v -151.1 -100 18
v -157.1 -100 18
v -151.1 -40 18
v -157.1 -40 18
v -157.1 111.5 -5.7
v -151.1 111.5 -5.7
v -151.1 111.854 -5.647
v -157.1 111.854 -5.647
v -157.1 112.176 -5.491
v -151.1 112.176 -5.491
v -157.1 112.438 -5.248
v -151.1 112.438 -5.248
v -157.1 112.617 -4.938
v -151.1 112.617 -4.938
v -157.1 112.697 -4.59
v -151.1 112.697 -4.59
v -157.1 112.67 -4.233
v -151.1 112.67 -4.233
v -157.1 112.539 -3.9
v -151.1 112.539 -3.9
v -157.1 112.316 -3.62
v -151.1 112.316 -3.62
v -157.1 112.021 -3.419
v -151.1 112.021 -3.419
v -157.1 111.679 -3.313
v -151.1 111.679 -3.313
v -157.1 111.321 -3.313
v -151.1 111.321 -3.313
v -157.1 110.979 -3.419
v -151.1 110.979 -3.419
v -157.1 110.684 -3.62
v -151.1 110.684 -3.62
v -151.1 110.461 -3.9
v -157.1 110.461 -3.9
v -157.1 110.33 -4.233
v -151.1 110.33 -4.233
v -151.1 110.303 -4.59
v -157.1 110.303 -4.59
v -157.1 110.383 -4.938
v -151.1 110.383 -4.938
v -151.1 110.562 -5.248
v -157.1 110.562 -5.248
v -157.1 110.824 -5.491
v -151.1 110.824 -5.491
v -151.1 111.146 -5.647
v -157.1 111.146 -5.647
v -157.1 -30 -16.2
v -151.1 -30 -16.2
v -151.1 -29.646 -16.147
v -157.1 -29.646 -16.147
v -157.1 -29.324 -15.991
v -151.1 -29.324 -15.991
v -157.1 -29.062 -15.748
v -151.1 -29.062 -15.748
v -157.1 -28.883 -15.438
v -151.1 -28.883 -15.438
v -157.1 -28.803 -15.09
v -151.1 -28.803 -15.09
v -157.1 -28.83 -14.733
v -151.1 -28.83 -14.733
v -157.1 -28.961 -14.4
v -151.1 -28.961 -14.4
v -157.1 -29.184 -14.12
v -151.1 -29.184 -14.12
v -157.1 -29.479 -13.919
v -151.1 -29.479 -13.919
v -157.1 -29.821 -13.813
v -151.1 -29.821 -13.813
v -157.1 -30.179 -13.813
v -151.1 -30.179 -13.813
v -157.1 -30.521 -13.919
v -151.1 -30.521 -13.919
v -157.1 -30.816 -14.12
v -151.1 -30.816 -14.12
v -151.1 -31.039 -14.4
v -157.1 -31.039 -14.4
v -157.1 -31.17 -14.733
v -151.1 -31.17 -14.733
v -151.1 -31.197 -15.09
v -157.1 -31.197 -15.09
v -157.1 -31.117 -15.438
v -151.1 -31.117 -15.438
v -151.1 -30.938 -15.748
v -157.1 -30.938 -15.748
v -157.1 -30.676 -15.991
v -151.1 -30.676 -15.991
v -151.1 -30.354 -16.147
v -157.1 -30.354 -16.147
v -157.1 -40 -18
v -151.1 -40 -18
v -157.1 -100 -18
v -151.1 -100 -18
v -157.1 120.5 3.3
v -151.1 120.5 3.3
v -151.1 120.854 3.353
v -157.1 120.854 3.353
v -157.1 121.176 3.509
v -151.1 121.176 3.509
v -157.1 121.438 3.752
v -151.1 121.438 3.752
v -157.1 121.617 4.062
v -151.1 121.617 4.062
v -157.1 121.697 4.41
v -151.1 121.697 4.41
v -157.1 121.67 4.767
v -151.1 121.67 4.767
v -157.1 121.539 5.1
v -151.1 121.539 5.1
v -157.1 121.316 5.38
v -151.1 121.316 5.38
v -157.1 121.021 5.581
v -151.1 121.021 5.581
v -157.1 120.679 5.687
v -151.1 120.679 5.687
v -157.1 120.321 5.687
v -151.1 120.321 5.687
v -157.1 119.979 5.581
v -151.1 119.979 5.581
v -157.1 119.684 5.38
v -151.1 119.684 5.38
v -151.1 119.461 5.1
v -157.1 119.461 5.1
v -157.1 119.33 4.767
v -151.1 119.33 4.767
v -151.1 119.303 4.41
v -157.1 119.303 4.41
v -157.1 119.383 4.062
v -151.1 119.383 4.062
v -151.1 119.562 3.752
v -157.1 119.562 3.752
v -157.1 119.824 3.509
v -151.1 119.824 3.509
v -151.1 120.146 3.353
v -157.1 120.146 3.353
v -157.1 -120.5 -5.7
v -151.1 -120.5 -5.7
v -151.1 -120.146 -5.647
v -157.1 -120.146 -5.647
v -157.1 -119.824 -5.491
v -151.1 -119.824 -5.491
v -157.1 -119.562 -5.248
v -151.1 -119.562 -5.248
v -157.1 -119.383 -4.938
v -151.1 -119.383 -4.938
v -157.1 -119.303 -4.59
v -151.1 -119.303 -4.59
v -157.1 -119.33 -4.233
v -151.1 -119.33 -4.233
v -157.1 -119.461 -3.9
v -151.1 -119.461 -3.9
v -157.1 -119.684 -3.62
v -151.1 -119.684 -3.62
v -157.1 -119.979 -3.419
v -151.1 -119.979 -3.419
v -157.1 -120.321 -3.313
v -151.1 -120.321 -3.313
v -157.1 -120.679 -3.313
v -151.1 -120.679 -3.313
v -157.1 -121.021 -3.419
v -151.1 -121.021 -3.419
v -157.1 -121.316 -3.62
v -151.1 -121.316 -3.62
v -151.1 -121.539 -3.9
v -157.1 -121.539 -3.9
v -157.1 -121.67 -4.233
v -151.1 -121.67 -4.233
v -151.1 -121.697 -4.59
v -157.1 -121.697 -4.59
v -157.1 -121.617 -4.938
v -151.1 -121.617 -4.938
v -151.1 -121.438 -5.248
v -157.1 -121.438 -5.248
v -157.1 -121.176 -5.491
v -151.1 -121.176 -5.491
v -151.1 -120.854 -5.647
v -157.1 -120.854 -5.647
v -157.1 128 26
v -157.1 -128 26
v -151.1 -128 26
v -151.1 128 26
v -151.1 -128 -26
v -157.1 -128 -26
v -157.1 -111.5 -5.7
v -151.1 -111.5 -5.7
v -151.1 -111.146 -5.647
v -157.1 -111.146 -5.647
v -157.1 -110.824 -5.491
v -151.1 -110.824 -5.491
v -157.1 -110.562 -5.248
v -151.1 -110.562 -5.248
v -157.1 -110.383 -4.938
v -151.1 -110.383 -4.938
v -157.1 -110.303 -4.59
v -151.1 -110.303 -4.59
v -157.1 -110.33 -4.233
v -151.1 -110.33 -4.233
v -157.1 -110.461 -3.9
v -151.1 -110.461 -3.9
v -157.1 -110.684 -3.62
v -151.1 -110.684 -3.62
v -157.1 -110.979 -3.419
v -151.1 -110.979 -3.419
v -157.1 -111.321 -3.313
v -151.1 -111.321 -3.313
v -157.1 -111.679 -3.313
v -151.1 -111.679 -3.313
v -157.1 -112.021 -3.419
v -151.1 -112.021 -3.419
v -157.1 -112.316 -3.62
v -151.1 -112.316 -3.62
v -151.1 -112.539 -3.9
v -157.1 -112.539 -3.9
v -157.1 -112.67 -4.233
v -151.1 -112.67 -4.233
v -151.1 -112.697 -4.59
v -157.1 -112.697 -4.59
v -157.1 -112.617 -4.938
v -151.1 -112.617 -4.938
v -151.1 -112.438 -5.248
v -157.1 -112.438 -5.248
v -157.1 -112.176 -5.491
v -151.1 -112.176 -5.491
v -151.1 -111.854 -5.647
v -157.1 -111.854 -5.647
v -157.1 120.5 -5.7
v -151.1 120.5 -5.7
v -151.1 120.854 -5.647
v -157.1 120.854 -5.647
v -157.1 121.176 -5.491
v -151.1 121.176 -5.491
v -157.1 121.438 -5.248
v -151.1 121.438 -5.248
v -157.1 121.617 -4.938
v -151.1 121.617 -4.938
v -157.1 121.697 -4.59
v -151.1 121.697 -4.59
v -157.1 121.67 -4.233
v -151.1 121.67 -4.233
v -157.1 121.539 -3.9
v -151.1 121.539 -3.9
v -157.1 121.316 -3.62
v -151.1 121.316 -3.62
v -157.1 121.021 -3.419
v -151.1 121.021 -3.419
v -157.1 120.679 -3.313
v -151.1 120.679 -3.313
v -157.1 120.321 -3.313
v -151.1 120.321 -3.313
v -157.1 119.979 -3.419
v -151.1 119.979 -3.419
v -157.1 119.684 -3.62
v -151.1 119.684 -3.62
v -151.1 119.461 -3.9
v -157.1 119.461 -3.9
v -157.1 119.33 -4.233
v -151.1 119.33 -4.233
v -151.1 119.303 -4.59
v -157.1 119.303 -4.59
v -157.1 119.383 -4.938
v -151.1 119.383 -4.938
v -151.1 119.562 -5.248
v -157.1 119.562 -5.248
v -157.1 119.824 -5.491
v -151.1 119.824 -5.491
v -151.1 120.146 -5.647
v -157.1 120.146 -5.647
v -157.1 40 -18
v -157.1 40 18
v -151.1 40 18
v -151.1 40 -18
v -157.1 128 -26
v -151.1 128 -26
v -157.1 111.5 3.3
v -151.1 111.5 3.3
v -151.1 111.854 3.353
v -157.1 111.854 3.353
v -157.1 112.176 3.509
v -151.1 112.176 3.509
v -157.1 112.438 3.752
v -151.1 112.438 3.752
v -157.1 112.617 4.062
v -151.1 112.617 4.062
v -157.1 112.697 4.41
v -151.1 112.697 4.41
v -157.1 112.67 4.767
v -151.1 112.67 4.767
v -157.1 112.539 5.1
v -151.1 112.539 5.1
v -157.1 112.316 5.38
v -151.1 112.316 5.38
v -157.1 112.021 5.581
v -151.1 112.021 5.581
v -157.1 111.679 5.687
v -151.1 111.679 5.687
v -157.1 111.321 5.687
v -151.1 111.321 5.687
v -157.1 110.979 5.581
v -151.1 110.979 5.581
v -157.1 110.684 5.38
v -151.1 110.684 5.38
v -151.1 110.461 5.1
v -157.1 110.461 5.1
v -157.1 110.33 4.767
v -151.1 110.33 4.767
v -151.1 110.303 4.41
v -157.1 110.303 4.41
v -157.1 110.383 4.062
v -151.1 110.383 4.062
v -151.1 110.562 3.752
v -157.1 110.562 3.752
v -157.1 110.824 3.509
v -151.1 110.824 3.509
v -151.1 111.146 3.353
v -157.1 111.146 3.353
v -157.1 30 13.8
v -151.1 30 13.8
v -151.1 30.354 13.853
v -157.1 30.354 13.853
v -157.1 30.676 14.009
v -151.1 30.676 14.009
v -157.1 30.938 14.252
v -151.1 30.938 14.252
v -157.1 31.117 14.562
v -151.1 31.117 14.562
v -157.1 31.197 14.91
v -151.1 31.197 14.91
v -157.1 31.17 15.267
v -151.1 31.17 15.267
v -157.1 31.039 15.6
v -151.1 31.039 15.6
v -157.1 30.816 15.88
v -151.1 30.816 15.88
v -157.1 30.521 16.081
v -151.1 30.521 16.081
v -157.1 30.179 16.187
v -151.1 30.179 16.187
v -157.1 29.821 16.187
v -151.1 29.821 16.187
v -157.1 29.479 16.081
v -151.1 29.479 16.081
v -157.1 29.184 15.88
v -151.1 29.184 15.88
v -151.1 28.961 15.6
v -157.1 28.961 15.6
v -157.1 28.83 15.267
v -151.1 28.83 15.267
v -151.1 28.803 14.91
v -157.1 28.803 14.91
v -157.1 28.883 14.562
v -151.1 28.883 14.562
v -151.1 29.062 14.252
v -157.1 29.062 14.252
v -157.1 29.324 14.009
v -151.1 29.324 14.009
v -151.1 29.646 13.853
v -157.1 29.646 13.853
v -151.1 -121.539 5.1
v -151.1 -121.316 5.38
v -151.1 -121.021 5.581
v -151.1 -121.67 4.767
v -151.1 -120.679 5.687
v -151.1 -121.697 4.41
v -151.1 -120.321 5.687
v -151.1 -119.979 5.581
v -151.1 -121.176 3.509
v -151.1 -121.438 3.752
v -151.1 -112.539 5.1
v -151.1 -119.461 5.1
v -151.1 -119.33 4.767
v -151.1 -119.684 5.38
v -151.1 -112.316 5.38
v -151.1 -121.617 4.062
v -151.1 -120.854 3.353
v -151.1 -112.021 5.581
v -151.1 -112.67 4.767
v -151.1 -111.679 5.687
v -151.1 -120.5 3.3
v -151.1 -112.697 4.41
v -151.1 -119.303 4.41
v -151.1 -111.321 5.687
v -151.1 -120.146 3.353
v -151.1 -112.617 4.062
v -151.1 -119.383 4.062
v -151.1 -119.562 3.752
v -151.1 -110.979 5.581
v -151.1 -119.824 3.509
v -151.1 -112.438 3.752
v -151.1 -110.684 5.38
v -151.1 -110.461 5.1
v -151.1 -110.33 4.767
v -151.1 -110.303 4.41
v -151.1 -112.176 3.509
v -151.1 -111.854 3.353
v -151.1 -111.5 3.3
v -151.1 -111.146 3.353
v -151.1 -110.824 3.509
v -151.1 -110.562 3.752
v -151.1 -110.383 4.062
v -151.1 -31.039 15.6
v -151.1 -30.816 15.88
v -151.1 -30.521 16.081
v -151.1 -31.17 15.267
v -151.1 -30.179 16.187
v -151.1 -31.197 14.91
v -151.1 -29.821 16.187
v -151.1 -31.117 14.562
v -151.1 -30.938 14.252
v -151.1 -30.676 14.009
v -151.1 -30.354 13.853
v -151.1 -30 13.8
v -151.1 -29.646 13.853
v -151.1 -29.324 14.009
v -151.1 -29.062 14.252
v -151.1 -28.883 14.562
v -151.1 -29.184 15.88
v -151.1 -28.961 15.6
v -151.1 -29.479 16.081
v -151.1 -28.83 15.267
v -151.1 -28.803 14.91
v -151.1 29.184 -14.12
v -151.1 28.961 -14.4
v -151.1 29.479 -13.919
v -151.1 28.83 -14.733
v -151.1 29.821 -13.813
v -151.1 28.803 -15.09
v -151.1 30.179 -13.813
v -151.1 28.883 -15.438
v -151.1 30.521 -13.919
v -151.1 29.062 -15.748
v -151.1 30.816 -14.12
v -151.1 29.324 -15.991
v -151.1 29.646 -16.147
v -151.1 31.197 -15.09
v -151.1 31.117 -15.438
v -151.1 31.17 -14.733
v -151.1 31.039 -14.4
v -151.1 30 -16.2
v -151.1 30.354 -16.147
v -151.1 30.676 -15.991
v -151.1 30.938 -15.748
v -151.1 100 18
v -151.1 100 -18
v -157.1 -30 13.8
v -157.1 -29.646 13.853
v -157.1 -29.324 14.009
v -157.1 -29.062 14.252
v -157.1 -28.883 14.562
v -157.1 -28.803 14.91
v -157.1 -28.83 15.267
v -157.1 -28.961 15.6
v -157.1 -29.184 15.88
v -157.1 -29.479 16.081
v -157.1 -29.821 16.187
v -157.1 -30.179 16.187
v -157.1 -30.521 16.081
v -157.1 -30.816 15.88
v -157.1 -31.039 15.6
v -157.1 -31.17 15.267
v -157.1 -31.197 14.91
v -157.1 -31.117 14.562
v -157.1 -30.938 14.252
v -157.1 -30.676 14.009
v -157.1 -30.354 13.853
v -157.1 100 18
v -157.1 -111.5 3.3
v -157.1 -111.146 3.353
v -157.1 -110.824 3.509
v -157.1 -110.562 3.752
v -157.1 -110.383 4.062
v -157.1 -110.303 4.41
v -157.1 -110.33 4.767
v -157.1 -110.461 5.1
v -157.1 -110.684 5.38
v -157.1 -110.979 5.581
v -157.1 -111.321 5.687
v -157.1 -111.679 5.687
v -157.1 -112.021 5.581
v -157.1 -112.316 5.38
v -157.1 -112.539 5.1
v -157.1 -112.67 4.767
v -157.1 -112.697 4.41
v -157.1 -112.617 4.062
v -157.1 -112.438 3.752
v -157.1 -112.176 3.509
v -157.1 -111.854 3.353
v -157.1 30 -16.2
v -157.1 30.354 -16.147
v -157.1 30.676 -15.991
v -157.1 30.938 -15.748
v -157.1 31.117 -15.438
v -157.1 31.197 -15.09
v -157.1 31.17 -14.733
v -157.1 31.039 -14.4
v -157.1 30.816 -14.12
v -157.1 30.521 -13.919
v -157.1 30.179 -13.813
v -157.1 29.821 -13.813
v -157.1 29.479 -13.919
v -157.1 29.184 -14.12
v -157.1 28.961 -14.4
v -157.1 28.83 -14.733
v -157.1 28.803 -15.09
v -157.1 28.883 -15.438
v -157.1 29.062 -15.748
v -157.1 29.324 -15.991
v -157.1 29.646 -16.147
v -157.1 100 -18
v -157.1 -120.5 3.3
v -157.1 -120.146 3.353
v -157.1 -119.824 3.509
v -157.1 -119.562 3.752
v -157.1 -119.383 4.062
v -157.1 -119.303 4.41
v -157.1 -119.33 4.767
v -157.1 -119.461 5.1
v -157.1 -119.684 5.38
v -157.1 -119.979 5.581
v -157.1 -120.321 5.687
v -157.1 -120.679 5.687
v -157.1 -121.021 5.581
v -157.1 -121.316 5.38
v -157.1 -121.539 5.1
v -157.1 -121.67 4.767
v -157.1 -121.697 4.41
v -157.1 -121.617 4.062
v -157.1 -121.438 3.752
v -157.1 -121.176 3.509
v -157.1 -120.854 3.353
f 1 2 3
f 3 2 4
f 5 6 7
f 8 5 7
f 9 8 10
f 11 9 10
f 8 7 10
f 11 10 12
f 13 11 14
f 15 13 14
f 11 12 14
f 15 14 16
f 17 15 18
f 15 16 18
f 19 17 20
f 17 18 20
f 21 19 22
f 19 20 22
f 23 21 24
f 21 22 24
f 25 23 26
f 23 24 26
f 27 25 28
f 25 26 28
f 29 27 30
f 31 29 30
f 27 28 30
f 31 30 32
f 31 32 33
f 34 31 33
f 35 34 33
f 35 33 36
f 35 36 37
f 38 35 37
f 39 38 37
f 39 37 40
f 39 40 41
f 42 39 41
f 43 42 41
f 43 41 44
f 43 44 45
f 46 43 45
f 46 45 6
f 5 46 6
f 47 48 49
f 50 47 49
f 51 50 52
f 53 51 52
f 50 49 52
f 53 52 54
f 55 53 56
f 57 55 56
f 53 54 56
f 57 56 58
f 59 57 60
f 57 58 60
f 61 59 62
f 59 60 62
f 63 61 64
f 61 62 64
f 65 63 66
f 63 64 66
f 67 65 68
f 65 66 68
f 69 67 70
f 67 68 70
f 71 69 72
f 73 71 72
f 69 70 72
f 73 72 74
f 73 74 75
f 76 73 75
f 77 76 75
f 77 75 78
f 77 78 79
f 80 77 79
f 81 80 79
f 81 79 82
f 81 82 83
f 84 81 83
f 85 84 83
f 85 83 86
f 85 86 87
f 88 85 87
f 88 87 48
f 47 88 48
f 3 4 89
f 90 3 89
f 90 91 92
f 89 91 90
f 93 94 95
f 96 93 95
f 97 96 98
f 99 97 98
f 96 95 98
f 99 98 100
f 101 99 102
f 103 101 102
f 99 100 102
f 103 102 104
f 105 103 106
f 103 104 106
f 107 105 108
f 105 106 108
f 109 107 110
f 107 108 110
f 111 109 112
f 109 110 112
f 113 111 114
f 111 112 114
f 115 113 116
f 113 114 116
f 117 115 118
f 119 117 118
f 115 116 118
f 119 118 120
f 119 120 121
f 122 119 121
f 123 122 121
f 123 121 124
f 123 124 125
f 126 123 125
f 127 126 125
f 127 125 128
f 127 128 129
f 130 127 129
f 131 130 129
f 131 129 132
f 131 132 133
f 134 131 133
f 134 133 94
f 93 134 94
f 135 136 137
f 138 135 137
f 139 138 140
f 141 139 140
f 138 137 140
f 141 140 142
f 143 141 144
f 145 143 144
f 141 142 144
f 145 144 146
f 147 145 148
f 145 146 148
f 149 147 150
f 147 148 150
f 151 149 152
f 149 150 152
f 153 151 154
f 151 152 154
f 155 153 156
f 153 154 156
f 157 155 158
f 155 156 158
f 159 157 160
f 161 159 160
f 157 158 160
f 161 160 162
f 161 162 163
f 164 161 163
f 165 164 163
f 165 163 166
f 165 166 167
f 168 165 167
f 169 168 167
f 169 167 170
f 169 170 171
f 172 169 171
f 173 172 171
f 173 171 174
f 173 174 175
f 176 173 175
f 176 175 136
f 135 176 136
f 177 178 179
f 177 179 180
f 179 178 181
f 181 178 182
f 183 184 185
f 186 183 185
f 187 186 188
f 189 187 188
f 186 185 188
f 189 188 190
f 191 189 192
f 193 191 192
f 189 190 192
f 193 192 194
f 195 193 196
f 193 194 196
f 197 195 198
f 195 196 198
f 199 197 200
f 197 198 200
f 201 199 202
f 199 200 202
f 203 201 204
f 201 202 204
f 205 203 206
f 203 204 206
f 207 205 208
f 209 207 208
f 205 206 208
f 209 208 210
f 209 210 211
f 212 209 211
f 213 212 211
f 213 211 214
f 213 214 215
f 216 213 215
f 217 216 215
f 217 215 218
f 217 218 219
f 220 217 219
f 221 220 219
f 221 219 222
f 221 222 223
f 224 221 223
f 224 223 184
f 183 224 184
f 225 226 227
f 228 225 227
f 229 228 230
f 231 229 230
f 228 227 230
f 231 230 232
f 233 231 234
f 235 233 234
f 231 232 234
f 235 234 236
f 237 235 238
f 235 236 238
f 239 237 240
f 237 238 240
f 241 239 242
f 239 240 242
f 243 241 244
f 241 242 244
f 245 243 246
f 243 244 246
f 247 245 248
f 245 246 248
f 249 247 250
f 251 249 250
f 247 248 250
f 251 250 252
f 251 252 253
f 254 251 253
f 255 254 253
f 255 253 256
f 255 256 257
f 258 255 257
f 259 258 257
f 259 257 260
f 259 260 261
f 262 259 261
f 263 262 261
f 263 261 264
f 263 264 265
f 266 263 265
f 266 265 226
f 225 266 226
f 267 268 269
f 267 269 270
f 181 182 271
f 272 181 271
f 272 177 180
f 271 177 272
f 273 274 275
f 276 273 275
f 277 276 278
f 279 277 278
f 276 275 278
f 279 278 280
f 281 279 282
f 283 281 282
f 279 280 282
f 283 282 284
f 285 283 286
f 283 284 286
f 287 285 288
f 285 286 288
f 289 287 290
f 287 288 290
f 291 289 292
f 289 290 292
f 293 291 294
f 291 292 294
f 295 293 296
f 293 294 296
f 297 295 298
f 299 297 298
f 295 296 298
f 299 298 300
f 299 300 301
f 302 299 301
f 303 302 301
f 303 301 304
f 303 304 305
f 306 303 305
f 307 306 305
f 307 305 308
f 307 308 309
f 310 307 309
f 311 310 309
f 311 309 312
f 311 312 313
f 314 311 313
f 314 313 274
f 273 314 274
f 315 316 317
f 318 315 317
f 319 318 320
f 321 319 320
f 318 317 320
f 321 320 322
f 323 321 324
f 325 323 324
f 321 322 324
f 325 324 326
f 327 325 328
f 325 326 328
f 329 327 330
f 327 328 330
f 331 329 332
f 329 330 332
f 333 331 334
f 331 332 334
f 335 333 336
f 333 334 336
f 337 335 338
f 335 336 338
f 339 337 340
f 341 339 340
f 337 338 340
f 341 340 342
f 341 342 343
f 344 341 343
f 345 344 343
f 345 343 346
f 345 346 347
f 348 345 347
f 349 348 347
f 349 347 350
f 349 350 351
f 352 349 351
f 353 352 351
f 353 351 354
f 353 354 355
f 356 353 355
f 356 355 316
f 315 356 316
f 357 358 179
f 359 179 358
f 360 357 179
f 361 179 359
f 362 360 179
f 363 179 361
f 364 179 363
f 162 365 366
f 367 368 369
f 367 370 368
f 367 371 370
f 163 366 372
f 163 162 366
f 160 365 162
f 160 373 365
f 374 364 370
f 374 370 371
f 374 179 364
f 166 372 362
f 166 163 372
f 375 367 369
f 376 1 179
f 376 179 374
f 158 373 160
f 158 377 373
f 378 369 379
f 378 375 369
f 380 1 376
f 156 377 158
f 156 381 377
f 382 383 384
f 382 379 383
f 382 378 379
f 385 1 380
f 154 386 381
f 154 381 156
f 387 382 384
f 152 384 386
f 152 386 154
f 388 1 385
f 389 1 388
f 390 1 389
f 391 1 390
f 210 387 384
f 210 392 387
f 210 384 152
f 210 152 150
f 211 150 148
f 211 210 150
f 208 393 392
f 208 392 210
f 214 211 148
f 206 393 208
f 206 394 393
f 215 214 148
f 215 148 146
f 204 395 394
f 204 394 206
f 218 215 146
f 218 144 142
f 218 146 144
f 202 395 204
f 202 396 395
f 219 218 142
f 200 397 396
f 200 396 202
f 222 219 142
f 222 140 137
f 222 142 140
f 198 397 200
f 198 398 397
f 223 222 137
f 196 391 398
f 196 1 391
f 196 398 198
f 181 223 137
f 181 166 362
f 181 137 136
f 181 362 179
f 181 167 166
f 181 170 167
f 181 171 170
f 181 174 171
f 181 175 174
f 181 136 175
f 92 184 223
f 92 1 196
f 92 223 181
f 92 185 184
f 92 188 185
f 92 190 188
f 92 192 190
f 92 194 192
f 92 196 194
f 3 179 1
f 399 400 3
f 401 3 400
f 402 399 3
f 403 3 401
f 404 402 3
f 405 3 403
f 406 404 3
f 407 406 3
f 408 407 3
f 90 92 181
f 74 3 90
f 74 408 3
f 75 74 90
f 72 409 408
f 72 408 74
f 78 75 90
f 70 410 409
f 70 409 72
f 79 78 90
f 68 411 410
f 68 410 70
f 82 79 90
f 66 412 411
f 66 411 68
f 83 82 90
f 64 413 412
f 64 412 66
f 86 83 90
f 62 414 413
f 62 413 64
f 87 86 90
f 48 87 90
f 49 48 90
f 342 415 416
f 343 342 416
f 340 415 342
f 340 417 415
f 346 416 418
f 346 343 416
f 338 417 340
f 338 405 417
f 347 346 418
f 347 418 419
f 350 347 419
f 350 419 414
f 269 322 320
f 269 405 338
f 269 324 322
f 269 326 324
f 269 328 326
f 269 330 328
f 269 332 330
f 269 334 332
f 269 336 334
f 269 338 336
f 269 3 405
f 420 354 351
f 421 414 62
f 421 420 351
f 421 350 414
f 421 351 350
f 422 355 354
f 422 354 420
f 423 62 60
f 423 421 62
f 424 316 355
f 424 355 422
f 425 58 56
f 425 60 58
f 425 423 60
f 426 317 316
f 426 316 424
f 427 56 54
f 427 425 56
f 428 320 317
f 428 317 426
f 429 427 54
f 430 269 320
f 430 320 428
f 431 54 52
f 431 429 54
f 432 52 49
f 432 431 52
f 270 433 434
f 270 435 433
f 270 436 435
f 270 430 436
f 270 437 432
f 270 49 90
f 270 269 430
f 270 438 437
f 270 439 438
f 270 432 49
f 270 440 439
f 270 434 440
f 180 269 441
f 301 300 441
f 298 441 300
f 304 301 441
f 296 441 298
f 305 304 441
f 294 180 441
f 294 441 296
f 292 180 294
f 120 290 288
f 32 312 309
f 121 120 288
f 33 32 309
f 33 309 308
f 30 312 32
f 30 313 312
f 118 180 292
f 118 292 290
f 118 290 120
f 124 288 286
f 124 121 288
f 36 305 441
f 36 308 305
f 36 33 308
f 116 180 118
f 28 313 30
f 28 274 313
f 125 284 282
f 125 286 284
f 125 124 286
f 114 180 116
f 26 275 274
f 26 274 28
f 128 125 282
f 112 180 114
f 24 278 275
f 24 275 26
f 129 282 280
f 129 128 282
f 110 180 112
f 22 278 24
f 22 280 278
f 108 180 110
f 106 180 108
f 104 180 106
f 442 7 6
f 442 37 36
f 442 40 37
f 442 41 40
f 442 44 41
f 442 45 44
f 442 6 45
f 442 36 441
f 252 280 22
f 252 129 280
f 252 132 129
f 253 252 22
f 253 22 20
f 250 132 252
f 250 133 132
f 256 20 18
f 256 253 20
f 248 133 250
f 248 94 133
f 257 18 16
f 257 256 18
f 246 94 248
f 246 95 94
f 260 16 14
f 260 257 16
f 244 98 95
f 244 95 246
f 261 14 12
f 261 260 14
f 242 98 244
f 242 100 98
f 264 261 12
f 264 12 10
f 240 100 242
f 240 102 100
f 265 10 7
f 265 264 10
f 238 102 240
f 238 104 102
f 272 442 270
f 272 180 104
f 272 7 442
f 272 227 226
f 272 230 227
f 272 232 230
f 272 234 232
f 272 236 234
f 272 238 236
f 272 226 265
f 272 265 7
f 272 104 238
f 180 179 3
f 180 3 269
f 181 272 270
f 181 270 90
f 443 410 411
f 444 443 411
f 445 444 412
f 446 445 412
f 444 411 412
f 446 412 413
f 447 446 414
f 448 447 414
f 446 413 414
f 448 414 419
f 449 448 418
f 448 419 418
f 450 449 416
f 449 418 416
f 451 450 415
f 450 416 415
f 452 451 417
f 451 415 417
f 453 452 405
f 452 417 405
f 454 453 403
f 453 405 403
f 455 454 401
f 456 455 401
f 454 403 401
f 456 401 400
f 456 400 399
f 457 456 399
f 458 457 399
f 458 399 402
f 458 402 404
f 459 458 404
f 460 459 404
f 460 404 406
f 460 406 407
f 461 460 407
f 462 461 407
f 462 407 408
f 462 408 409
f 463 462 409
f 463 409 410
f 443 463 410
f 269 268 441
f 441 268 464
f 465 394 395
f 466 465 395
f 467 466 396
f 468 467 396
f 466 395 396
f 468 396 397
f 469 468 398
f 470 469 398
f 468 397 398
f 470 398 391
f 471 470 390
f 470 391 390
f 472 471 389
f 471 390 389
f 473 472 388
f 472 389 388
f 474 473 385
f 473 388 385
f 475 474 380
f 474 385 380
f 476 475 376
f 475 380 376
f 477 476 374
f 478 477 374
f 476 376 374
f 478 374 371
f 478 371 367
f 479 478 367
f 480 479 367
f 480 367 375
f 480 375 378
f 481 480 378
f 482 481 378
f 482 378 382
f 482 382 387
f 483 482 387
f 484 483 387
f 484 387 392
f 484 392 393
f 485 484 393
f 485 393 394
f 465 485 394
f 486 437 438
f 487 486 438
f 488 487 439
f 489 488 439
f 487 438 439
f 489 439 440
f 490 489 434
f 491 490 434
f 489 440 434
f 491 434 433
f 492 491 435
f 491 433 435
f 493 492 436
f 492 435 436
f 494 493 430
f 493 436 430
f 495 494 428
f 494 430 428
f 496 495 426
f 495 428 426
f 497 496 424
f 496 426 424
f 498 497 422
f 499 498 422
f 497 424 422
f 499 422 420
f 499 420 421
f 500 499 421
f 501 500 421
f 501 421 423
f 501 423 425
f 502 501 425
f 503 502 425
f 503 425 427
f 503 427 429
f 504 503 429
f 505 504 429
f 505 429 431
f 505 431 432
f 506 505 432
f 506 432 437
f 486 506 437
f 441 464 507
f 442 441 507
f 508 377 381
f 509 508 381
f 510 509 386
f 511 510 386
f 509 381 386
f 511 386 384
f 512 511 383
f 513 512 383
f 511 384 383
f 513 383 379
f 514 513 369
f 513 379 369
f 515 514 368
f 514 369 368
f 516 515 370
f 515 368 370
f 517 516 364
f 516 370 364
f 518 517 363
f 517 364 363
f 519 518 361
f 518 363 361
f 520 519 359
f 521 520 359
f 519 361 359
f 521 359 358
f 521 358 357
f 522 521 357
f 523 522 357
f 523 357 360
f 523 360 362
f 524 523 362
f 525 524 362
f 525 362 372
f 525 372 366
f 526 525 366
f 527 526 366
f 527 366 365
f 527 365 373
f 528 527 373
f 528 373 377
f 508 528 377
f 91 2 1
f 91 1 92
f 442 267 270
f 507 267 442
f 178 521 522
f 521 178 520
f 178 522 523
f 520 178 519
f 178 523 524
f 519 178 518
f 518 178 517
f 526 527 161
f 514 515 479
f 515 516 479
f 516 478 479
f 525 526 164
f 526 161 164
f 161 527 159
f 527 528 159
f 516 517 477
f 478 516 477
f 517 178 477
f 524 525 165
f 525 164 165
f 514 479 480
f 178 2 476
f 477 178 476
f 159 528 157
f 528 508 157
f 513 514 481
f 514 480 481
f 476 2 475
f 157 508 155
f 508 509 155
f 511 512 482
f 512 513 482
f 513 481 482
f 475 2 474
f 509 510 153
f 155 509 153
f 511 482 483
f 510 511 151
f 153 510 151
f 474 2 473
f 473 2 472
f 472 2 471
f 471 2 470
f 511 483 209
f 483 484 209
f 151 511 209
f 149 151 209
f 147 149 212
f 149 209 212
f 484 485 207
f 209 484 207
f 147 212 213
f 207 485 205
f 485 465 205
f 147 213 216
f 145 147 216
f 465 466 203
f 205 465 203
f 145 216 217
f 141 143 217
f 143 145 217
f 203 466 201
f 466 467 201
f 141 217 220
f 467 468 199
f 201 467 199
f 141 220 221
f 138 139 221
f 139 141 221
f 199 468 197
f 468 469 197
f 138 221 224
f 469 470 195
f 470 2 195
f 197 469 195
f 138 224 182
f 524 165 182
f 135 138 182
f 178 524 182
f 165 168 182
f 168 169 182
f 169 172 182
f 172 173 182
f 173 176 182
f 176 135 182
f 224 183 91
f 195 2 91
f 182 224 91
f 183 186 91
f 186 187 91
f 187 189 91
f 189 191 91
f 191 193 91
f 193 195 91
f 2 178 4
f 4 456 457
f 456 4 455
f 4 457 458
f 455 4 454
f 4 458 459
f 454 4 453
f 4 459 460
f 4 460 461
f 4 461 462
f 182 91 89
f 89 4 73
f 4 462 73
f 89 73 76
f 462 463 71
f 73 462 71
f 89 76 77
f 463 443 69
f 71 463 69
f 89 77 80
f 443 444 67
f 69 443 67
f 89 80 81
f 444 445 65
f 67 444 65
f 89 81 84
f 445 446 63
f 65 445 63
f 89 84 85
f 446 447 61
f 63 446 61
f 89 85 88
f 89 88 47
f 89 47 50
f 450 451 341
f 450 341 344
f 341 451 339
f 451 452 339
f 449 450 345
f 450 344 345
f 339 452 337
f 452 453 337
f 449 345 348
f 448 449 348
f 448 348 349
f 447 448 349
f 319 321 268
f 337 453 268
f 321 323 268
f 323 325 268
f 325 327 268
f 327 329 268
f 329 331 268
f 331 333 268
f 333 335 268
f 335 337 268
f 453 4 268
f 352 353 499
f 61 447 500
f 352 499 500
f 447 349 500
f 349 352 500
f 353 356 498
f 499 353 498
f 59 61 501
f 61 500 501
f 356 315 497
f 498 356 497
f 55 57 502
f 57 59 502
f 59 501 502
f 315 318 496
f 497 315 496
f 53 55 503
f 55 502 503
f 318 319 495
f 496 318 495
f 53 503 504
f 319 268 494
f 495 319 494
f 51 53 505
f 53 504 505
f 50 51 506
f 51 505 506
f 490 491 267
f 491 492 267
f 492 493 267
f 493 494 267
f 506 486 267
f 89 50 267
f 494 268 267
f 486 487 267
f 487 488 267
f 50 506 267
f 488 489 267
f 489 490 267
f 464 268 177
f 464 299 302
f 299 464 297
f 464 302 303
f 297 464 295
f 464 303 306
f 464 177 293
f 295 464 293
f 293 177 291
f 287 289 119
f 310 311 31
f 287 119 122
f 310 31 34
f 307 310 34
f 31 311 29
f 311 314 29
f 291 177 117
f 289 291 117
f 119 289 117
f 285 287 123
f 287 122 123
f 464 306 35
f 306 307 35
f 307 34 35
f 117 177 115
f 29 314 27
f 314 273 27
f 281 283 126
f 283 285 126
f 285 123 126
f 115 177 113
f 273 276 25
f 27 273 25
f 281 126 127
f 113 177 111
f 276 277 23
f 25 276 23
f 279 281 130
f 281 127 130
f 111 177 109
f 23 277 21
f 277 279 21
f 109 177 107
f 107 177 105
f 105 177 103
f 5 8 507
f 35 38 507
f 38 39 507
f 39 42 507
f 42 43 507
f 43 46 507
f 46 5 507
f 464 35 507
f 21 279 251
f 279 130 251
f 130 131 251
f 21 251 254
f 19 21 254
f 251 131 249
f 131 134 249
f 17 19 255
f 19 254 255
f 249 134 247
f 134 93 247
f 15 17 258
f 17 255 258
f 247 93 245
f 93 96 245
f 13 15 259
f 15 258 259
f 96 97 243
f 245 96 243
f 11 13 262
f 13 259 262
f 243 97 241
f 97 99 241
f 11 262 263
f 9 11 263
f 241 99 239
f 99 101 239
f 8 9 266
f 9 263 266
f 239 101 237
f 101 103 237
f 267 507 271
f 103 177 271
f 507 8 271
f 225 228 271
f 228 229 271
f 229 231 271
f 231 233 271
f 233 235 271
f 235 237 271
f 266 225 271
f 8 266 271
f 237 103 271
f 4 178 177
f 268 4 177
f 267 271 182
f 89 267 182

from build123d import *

# Parameters (mm, degrees)
SKETCH1_W             = 52
SKETCH1_H             = 256
BOSS_EXTRUDE1_DEPTH   = 6
M2_CLEARANCE_HOLE1_D  = 2.4
M2_CLEARANCE_HOLE2_D  = 2.4
M2_CLEARANCE_HOLE3_D  = 2.4
M2_CLEARANCE_HOLE4_D  = 2.4
M2_CLEARANCE_HOLE5_D  = 2.4
M2_CLEARANCE_HOLE6_D  = 2.4
M2_CLEARANCE_HOLE7_D  = 2.4
M2_CLEARANCE_HOLE8_D  = 2.4
M2_CLEARANCE_HOLE9_D  = 2.4
M2_CLEARANCE_HOLE10_D = 2.4
M2_CLEARANCE_HOLE11_D = 2.4
M2_CLEARANCE_HOLE12_D = 2.4
SKETCH26_W            = 36
SKETCH26_H            = 60
CUT_EXTRUDE2_DEPTH    = 6
SKETCH27_W            = 36
SKETCH27_H            = 60
CUT_EXTRUDE4_DEPTH    = 6


with BuildPart() as part:
    # Sketch1 → Boss-Extrude1 (new body)
    with BuildSketch(Plane(origin=(-157.1, 0, 0), x_dir=(0, 0, -1), z_dir=(1, 0, 0))):
        Rectangle(SKETCH1_W, SKETCH1_H)
    extrude(amount=BOSS_EXTRUDE1_DEPTH)

    # M2 Clearance Hole1 (through all)
    with Locations(Plane.ZY.offset(157.1)):
        with Locations((-4.5, 111.5)):
            Hole(M2_CLEARANCE_HOLE1_D / 2)

    # M2 Clearance Hole2 (through all)
    with Locations(Plane.ZY.offset(157.1)):
        with Locations((4.5, 111.5)):
            Hole(M2_CLEARANCE_HOLE2_D / 2)

    # M2 Clearance Hole3 (through all)
    with Locations(Plane.ZY.offset(157.1)):
        with Locations((-4.5, 120.5)):
            Hole(M2_CLEARANCE_HOLE3_D / 2)

    # M2 Clearance Hole4 (through all)
    with Locations(Plane.ZY.offset(157.1)):
        with Locations((4.5, 120.5)):
            Hole(M2_CLEARANCE_HOLE4_D / 2)

    # M2 Clearance Hole5 (through all)
    with Locations(Plane.ZY.offset(157.1)):
        with Locations((-4.5, -120.5)):
            Hole(M2_CLEARANCE_HOLE5_D / 2)

    # M2 Clearance Hole6 (through all)
    with Locations(Plane.ZY.offset(157.1)):
        with Locations((4.5, -120.5)):
            Hole(M2_CLEARANCE_HOLE6_D / 2)

    # M2 Clearance Hole7 (through all)
    with Locations(Plane.ZY.offset(157.1)):
        with Locations((-4.5, -111.5)):
            Hole(M2_CLEARANCE_HOLE7_D / 2)

    # M2 Clearance Hole8 (through all)
    with Locations(Plane.ZY.offset(157.1)):
        with Locations((4.5, -111.5)):
            Hole(M2_CLEARANCE_HOLE8_D / 2)

    # M2 Clearance Hole9 (through all)
    with Locations(Plane.ZY.offset(157.1)):
        with Locations((-15, -30)):
            Hole(M2_CLEARANCE_HOLE9_D / 2)

    # M2 Clearance Hole10 (through all)
    with Locations(Plane.ZY.offset(157.1)):
        with Locations((15, -30)):
            Hole(M2_CLEARANCE_HOLE10_D / 2)

    # M2 Clearance Hole11 (through all)
    with Locations(Plane.ZY.offset(157.1)):
        with Locations((-15, 30)):
            Hole(M2_CLEARANCE_HOLE11_D / 2)

    # M2 Clearance Hole12 (through all)
    with Locations(Plane.ZY.offset(157.1)):
        with Locations((15, 30)):
            Hole(M2_CLEARANCE_HOLE12_D / 2)

    # Sketch26 → Cut-Extrude2 (cut)
    with BuildSketch(Plane(origin=(-157.1, 0, 0), x_dir=(0, 0, -1), z_dir=(1, 0, 0))):
        with Locations((0, 70)):
            Rectangle(SKETCH26_W, SKETCH26_H)
    extrude(amount=CUT_EXTRUDE2_DEPTH, mode=Mode.SUBTRACT)

    # Sketch27 → Cut-Extrude4 (cut)
    with BuildSketch(Plane(origin=(-157.1, 0, 0), x_dir=(0, 0, -1), z_dir=(1, 0, 0))):
        with Locations((0, -70)):
            Rectangle(SKETCH27_W, SKETCH27_H)
    extrude(amount=CUT_EXTRUDE4_DEPTH, mode=Mode.SUBTRACT)


solid = part.part
